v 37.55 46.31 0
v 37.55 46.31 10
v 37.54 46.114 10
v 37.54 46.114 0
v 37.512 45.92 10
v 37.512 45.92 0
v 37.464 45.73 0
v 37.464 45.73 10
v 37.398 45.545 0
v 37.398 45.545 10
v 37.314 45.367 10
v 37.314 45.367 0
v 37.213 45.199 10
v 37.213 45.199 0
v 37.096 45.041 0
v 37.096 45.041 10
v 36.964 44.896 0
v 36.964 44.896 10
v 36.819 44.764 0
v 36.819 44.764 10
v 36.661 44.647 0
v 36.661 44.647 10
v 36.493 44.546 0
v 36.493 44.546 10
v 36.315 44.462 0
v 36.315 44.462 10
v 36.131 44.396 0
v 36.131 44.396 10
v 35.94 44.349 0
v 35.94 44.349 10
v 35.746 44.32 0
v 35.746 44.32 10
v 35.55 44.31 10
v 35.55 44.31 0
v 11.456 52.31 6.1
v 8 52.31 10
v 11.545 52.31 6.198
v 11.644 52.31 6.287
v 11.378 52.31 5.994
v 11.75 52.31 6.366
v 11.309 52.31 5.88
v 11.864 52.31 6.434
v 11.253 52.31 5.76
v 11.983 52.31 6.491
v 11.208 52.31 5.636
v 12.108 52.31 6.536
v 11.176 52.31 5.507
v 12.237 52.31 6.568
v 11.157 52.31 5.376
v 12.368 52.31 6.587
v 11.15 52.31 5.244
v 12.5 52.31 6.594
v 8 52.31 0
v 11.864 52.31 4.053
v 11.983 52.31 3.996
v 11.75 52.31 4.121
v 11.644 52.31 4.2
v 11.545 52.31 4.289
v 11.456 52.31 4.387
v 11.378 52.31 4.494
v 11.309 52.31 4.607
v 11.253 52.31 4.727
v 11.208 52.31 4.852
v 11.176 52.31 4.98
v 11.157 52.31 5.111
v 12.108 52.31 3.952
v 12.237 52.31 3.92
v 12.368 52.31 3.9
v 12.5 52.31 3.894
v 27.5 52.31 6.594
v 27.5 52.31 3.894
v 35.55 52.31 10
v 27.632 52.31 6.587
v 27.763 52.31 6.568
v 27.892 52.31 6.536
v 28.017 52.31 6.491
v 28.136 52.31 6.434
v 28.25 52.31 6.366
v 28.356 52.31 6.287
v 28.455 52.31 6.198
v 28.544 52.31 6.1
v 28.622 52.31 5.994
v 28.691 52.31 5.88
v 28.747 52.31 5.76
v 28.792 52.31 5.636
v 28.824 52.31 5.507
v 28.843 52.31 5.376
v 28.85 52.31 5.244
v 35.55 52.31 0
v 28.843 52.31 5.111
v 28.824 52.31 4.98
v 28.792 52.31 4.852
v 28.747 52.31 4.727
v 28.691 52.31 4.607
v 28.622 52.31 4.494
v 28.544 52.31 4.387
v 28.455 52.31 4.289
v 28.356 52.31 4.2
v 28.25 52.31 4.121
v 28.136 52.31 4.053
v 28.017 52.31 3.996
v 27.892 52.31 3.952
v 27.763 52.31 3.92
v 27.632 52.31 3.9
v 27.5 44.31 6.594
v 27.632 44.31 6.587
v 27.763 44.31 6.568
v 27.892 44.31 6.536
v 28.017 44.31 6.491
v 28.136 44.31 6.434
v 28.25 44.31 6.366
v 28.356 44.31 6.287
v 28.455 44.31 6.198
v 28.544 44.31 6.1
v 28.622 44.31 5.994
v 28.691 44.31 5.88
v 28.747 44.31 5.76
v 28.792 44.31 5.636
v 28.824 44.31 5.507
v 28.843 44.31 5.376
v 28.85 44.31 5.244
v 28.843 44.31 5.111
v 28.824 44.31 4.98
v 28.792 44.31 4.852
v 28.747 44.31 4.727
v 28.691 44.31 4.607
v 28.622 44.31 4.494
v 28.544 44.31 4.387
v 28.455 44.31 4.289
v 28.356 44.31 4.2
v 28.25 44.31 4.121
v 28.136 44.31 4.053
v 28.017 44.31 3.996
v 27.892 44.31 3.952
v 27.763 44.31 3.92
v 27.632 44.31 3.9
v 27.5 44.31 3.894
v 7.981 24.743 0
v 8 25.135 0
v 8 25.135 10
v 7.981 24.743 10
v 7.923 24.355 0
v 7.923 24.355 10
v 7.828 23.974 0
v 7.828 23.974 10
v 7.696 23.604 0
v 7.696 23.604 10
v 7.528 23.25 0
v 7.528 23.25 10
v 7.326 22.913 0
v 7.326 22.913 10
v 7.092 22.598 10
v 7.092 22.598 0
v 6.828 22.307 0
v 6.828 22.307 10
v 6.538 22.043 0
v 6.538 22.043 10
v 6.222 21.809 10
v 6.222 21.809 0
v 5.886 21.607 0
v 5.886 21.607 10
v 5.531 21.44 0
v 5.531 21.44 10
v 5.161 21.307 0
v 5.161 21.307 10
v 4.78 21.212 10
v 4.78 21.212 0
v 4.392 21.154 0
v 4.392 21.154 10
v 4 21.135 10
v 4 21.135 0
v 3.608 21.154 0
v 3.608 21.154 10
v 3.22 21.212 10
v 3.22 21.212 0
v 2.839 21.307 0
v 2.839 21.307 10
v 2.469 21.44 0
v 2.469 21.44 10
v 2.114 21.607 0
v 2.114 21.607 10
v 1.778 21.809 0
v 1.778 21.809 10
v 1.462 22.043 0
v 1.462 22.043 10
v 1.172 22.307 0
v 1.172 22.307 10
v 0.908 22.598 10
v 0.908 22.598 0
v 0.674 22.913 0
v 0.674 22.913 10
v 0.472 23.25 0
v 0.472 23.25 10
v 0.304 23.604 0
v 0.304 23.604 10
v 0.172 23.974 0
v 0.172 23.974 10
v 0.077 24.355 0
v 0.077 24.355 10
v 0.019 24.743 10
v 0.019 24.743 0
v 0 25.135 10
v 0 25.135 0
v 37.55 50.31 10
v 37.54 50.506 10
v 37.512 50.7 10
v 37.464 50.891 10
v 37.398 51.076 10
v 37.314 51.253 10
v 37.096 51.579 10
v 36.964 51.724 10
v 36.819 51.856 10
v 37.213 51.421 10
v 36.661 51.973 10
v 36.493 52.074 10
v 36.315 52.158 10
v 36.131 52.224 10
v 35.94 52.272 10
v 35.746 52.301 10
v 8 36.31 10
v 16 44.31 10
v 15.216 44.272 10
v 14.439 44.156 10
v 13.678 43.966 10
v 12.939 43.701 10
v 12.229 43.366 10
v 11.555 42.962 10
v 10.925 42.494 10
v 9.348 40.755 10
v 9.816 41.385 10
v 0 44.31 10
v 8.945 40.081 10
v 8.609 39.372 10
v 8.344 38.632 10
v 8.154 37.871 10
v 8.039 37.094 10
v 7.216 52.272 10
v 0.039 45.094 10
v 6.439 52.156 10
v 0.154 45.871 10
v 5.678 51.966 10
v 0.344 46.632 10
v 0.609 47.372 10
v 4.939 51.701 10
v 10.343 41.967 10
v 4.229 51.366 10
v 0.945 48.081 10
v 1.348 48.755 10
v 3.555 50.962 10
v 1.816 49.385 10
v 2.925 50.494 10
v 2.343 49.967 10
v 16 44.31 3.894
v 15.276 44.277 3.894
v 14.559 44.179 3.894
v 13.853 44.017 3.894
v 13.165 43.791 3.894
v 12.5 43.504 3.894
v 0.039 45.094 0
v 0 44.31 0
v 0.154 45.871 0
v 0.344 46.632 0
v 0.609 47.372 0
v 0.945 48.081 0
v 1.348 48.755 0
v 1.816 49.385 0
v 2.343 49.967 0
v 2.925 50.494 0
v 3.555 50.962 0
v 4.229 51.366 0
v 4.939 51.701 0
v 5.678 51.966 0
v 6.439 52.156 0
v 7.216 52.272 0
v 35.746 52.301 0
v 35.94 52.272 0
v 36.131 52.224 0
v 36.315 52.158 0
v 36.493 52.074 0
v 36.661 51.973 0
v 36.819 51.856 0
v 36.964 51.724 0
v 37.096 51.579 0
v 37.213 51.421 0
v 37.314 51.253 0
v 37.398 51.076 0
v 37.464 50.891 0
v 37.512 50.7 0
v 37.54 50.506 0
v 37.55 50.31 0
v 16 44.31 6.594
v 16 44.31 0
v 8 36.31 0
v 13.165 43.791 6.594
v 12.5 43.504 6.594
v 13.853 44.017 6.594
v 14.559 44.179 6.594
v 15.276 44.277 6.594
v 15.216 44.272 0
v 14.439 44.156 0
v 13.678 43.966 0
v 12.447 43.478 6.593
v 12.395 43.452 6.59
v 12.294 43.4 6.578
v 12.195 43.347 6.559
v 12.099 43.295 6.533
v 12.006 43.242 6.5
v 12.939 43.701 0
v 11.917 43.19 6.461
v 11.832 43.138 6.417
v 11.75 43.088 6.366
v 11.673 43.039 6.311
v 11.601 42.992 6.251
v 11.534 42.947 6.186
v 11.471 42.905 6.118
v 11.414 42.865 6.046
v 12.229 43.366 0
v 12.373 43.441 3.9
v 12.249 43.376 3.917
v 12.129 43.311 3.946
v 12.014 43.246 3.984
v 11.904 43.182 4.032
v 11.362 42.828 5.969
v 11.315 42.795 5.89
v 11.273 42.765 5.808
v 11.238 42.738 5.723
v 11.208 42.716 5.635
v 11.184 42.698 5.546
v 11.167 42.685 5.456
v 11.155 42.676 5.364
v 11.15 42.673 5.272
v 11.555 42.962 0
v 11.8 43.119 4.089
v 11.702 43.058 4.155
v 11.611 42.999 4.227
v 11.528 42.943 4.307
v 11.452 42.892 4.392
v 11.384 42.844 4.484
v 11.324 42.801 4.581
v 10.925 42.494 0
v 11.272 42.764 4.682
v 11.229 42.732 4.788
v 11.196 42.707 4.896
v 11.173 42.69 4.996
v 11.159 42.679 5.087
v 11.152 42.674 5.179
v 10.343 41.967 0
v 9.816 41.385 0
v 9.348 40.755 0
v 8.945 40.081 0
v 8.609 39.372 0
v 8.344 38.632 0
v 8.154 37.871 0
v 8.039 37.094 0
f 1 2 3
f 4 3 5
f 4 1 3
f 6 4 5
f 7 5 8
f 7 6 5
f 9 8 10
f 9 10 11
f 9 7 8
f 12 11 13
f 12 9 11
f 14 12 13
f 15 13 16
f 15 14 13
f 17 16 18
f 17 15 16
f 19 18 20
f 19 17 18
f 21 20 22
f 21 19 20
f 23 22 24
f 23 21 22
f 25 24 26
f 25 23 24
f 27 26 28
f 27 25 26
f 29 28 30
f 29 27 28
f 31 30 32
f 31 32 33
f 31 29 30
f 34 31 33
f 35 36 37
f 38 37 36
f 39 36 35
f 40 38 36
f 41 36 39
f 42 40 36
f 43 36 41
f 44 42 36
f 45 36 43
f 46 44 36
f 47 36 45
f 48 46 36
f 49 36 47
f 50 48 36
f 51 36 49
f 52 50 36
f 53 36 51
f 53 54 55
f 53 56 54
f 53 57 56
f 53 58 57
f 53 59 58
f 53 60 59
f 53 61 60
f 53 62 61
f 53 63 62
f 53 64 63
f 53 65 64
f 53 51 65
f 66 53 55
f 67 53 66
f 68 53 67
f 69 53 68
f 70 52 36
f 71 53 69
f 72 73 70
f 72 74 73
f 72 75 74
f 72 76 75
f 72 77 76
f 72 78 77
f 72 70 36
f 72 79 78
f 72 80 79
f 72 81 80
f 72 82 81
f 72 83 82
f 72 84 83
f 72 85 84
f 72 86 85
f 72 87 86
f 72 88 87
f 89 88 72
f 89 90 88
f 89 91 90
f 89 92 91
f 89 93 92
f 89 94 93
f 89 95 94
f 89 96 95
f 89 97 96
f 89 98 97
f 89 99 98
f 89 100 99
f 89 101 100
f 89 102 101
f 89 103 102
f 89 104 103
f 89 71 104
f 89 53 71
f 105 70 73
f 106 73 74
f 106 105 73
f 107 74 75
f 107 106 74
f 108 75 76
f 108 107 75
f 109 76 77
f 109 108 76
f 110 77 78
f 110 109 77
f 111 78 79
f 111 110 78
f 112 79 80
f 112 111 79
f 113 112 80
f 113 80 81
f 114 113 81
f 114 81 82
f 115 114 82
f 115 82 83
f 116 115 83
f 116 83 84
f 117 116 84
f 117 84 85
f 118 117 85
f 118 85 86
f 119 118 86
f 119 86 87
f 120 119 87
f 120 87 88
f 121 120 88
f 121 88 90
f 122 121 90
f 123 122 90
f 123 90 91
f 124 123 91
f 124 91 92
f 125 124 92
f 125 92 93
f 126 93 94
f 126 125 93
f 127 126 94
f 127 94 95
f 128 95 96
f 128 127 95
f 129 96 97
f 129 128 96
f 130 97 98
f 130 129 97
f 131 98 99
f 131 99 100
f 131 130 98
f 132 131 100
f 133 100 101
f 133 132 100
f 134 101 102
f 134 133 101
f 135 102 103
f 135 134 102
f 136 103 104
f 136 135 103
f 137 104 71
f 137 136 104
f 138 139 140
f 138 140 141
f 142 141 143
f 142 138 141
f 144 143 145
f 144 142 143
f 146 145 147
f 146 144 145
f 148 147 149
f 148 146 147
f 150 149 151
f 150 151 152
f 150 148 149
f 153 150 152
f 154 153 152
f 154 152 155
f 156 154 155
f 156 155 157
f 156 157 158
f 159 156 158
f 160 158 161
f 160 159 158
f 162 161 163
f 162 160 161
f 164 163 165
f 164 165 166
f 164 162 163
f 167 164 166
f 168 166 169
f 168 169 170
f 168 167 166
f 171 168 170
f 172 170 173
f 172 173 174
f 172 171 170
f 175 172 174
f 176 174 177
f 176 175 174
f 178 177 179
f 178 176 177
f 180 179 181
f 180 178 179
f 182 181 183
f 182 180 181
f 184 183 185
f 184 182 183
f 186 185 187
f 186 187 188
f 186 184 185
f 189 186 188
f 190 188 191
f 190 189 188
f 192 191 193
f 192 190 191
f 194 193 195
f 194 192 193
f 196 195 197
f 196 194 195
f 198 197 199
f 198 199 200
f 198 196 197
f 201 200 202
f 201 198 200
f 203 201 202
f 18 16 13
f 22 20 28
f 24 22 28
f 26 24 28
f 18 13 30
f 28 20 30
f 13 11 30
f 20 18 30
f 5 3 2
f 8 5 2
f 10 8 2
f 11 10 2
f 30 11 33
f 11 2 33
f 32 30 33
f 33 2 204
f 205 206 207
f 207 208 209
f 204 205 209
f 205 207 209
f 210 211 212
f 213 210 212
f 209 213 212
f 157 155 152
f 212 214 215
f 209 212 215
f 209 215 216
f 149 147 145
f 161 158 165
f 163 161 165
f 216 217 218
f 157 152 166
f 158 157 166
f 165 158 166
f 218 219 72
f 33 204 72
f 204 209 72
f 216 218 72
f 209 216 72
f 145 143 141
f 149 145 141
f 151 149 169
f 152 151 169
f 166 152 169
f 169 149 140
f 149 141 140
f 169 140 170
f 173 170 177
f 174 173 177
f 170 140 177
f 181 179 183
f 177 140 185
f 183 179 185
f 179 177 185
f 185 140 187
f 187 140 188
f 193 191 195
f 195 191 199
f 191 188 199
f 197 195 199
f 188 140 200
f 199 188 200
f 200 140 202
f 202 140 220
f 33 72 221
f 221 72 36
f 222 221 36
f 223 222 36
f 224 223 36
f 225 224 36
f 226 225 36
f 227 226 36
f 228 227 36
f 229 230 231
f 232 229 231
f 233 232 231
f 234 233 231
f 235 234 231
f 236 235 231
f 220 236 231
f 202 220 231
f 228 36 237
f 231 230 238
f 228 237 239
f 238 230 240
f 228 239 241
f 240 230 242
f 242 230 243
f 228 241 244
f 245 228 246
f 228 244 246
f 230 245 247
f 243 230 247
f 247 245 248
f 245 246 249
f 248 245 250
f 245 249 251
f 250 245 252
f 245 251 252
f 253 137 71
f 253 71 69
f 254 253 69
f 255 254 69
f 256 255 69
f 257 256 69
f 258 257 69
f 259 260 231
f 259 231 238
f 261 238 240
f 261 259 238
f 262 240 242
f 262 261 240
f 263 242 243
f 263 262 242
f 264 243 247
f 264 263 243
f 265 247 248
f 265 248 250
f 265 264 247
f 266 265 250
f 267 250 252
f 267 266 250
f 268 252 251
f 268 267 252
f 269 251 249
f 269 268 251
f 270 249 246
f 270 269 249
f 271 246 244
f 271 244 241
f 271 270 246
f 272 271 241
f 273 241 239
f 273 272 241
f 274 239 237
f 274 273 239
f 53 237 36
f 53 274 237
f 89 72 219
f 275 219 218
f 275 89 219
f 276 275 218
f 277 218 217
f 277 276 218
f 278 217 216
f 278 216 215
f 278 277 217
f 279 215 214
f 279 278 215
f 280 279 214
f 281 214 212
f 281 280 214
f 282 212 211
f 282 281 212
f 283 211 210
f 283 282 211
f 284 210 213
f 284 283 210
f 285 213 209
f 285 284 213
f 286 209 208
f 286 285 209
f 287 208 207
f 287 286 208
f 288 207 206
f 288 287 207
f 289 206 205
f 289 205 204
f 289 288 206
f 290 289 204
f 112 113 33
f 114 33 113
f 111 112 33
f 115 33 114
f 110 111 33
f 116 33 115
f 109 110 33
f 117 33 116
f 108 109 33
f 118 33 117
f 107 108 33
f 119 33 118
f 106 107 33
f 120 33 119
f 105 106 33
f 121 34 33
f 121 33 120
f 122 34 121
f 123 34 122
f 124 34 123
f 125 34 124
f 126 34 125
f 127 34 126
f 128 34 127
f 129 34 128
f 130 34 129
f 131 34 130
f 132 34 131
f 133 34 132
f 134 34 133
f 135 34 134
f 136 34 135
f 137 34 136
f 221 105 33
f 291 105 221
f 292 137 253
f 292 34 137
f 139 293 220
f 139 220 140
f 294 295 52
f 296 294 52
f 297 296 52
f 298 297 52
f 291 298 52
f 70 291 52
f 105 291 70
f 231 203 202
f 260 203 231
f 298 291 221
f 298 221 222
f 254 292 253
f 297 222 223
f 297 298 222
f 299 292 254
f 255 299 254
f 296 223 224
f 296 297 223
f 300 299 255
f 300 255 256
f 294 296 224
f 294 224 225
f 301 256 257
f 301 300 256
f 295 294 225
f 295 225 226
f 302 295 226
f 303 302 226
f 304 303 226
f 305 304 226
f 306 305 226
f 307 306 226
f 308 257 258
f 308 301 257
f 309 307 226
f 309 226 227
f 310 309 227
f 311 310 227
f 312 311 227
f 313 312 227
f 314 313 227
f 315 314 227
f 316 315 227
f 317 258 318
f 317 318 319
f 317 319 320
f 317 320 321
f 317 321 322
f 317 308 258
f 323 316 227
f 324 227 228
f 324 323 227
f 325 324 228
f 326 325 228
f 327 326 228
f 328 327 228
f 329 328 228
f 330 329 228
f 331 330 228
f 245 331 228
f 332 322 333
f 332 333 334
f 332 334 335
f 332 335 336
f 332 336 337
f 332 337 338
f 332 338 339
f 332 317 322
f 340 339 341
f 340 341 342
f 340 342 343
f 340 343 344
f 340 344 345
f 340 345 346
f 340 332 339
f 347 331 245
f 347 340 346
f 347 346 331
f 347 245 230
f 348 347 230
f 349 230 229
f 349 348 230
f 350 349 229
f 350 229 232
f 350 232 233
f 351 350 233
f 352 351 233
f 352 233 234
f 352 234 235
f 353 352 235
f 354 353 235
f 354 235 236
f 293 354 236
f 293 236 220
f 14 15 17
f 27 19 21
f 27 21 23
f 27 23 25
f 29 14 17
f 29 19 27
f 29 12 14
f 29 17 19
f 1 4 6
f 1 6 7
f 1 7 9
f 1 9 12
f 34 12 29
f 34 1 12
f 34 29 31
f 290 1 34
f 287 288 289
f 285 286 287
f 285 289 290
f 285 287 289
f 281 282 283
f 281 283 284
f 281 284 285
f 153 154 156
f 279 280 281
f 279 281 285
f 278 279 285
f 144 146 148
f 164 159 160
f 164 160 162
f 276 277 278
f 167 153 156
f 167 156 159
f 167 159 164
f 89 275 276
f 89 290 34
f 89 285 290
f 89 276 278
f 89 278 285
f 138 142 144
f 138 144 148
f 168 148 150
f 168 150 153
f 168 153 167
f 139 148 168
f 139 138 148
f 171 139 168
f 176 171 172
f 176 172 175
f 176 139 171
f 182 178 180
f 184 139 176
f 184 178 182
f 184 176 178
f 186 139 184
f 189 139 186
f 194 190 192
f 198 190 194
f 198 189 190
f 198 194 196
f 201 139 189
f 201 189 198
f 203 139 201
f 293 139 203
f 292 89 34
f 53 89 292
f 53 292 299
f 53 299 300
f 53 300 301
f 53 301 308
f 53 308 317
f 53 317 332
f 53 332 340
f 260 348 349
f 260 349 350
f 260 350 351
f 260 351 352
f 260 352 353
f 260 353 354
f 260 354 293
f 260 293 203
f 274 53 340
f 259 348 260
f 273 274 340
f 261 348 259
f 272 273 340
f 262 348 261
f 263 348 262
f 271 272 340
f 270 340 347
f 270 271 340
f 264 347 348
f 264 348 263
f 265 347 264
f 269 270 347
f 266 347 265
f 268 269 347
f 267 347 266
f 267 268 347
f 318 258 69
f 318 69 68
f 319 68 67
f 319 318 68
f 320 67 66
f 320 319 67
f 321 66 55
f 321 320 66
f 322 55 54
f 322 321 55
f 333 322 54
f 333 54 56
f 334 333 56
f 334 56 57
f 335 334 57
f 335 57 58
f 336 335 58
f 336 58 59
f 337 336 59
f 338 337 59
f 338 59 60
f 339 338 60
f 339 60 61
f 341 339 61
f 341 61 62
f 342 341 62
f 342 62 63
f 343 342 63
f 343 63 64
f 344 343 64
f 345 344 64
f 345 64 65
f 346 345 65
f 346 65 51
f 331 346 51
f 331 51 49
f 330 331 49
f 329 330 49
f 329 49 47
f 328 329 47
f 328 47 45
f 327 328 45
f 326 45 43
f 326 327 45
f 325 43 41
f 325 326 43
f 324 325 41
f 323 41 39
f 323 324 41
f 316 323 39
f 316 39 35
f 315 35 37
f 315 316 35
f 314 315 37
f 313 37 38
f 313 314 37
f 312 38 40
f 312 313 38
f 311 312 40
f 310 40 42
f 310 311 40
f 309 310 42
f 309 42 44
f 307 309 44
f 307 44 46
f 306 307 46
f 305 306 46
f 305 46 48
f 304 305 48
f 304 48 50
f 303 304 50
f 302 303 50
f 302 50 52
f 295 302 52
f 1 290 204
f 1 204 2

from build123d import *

# Parameters (mm, degrees)
BOSS_EXTRUDE1_DEPTH        = 10
M2_5_START                 = 36.310160318
M2_5_CLEARANCE_SLOT1_DEPTH = 16


with BuildPart() as part:
    # Sketch1 → Boss-Extrude1 (new body)
    with BuildSketch(Plane.XY):
        with BuildLine():
            Line((0, 25.135160318), (0, 44.310160318))
            ThreePointArc((0, 44.310160318), (2.343145751, 49.967014567), (8, 52.310160318))
            Line((8, 52.310160318), (35.55, 52.310160318))
            ThreePointArc((35.55, 52.310160318), (36.964213562, 51.72437388), (37.55, 50.310160318))
            Line((37.55, 50.310160318), (37.55, 46.310160318))
            ThreePointArc((37.55, 46.310160318), (36.964213562, 44.895946756), (35.55, 44.310160318))
            Line((35.55, 44.310160318), (16, 44.310160318))
            ThreePointArc((16, 44.310160318), (10.343145751, 41.967014567), (8, 36.310160318))
            Line((8, 36.310160318), (8, 25.135160318))
            ThreePointArc((8, 25.135160318), (4, 21.135160318), (0, 25.135160318))
        make_face()
    extrude(amount=BOSS_EXTRUDE1_DEPTH)

    # M2.5 Clearance Slot1: read off the stored shape, not the designer's step
    # M2.5 Clearance Slot1 outline → M2.5 Clearance Slot1 (cut)
    with BuildSketch(Plane(origin=(0, 0, 0), x_dir=(1, 0, 0), z_dir=(0, 1, 0)).offset(M2_5_START)):
        with BuildLine():
            Line((12.5, -6.593666906), (27.5, -6.593666906))
            ThreePointArc((27.5, -6.593666906), (28.85, -5.243666906), (27.5, -3.893666906))
            Line((27.5, -3.893666906), (12.5, -3.893666906))
            ThreePointArc((12.5, -3.893666906), (11.15, -5.243666906), (12.5, -6.593666906))
        make_face()
    extrude(amount=M2_5_CLEARANCE_SLOT1_DEPTH, mode=Mode.SUBTRACT)


solid = part.part
